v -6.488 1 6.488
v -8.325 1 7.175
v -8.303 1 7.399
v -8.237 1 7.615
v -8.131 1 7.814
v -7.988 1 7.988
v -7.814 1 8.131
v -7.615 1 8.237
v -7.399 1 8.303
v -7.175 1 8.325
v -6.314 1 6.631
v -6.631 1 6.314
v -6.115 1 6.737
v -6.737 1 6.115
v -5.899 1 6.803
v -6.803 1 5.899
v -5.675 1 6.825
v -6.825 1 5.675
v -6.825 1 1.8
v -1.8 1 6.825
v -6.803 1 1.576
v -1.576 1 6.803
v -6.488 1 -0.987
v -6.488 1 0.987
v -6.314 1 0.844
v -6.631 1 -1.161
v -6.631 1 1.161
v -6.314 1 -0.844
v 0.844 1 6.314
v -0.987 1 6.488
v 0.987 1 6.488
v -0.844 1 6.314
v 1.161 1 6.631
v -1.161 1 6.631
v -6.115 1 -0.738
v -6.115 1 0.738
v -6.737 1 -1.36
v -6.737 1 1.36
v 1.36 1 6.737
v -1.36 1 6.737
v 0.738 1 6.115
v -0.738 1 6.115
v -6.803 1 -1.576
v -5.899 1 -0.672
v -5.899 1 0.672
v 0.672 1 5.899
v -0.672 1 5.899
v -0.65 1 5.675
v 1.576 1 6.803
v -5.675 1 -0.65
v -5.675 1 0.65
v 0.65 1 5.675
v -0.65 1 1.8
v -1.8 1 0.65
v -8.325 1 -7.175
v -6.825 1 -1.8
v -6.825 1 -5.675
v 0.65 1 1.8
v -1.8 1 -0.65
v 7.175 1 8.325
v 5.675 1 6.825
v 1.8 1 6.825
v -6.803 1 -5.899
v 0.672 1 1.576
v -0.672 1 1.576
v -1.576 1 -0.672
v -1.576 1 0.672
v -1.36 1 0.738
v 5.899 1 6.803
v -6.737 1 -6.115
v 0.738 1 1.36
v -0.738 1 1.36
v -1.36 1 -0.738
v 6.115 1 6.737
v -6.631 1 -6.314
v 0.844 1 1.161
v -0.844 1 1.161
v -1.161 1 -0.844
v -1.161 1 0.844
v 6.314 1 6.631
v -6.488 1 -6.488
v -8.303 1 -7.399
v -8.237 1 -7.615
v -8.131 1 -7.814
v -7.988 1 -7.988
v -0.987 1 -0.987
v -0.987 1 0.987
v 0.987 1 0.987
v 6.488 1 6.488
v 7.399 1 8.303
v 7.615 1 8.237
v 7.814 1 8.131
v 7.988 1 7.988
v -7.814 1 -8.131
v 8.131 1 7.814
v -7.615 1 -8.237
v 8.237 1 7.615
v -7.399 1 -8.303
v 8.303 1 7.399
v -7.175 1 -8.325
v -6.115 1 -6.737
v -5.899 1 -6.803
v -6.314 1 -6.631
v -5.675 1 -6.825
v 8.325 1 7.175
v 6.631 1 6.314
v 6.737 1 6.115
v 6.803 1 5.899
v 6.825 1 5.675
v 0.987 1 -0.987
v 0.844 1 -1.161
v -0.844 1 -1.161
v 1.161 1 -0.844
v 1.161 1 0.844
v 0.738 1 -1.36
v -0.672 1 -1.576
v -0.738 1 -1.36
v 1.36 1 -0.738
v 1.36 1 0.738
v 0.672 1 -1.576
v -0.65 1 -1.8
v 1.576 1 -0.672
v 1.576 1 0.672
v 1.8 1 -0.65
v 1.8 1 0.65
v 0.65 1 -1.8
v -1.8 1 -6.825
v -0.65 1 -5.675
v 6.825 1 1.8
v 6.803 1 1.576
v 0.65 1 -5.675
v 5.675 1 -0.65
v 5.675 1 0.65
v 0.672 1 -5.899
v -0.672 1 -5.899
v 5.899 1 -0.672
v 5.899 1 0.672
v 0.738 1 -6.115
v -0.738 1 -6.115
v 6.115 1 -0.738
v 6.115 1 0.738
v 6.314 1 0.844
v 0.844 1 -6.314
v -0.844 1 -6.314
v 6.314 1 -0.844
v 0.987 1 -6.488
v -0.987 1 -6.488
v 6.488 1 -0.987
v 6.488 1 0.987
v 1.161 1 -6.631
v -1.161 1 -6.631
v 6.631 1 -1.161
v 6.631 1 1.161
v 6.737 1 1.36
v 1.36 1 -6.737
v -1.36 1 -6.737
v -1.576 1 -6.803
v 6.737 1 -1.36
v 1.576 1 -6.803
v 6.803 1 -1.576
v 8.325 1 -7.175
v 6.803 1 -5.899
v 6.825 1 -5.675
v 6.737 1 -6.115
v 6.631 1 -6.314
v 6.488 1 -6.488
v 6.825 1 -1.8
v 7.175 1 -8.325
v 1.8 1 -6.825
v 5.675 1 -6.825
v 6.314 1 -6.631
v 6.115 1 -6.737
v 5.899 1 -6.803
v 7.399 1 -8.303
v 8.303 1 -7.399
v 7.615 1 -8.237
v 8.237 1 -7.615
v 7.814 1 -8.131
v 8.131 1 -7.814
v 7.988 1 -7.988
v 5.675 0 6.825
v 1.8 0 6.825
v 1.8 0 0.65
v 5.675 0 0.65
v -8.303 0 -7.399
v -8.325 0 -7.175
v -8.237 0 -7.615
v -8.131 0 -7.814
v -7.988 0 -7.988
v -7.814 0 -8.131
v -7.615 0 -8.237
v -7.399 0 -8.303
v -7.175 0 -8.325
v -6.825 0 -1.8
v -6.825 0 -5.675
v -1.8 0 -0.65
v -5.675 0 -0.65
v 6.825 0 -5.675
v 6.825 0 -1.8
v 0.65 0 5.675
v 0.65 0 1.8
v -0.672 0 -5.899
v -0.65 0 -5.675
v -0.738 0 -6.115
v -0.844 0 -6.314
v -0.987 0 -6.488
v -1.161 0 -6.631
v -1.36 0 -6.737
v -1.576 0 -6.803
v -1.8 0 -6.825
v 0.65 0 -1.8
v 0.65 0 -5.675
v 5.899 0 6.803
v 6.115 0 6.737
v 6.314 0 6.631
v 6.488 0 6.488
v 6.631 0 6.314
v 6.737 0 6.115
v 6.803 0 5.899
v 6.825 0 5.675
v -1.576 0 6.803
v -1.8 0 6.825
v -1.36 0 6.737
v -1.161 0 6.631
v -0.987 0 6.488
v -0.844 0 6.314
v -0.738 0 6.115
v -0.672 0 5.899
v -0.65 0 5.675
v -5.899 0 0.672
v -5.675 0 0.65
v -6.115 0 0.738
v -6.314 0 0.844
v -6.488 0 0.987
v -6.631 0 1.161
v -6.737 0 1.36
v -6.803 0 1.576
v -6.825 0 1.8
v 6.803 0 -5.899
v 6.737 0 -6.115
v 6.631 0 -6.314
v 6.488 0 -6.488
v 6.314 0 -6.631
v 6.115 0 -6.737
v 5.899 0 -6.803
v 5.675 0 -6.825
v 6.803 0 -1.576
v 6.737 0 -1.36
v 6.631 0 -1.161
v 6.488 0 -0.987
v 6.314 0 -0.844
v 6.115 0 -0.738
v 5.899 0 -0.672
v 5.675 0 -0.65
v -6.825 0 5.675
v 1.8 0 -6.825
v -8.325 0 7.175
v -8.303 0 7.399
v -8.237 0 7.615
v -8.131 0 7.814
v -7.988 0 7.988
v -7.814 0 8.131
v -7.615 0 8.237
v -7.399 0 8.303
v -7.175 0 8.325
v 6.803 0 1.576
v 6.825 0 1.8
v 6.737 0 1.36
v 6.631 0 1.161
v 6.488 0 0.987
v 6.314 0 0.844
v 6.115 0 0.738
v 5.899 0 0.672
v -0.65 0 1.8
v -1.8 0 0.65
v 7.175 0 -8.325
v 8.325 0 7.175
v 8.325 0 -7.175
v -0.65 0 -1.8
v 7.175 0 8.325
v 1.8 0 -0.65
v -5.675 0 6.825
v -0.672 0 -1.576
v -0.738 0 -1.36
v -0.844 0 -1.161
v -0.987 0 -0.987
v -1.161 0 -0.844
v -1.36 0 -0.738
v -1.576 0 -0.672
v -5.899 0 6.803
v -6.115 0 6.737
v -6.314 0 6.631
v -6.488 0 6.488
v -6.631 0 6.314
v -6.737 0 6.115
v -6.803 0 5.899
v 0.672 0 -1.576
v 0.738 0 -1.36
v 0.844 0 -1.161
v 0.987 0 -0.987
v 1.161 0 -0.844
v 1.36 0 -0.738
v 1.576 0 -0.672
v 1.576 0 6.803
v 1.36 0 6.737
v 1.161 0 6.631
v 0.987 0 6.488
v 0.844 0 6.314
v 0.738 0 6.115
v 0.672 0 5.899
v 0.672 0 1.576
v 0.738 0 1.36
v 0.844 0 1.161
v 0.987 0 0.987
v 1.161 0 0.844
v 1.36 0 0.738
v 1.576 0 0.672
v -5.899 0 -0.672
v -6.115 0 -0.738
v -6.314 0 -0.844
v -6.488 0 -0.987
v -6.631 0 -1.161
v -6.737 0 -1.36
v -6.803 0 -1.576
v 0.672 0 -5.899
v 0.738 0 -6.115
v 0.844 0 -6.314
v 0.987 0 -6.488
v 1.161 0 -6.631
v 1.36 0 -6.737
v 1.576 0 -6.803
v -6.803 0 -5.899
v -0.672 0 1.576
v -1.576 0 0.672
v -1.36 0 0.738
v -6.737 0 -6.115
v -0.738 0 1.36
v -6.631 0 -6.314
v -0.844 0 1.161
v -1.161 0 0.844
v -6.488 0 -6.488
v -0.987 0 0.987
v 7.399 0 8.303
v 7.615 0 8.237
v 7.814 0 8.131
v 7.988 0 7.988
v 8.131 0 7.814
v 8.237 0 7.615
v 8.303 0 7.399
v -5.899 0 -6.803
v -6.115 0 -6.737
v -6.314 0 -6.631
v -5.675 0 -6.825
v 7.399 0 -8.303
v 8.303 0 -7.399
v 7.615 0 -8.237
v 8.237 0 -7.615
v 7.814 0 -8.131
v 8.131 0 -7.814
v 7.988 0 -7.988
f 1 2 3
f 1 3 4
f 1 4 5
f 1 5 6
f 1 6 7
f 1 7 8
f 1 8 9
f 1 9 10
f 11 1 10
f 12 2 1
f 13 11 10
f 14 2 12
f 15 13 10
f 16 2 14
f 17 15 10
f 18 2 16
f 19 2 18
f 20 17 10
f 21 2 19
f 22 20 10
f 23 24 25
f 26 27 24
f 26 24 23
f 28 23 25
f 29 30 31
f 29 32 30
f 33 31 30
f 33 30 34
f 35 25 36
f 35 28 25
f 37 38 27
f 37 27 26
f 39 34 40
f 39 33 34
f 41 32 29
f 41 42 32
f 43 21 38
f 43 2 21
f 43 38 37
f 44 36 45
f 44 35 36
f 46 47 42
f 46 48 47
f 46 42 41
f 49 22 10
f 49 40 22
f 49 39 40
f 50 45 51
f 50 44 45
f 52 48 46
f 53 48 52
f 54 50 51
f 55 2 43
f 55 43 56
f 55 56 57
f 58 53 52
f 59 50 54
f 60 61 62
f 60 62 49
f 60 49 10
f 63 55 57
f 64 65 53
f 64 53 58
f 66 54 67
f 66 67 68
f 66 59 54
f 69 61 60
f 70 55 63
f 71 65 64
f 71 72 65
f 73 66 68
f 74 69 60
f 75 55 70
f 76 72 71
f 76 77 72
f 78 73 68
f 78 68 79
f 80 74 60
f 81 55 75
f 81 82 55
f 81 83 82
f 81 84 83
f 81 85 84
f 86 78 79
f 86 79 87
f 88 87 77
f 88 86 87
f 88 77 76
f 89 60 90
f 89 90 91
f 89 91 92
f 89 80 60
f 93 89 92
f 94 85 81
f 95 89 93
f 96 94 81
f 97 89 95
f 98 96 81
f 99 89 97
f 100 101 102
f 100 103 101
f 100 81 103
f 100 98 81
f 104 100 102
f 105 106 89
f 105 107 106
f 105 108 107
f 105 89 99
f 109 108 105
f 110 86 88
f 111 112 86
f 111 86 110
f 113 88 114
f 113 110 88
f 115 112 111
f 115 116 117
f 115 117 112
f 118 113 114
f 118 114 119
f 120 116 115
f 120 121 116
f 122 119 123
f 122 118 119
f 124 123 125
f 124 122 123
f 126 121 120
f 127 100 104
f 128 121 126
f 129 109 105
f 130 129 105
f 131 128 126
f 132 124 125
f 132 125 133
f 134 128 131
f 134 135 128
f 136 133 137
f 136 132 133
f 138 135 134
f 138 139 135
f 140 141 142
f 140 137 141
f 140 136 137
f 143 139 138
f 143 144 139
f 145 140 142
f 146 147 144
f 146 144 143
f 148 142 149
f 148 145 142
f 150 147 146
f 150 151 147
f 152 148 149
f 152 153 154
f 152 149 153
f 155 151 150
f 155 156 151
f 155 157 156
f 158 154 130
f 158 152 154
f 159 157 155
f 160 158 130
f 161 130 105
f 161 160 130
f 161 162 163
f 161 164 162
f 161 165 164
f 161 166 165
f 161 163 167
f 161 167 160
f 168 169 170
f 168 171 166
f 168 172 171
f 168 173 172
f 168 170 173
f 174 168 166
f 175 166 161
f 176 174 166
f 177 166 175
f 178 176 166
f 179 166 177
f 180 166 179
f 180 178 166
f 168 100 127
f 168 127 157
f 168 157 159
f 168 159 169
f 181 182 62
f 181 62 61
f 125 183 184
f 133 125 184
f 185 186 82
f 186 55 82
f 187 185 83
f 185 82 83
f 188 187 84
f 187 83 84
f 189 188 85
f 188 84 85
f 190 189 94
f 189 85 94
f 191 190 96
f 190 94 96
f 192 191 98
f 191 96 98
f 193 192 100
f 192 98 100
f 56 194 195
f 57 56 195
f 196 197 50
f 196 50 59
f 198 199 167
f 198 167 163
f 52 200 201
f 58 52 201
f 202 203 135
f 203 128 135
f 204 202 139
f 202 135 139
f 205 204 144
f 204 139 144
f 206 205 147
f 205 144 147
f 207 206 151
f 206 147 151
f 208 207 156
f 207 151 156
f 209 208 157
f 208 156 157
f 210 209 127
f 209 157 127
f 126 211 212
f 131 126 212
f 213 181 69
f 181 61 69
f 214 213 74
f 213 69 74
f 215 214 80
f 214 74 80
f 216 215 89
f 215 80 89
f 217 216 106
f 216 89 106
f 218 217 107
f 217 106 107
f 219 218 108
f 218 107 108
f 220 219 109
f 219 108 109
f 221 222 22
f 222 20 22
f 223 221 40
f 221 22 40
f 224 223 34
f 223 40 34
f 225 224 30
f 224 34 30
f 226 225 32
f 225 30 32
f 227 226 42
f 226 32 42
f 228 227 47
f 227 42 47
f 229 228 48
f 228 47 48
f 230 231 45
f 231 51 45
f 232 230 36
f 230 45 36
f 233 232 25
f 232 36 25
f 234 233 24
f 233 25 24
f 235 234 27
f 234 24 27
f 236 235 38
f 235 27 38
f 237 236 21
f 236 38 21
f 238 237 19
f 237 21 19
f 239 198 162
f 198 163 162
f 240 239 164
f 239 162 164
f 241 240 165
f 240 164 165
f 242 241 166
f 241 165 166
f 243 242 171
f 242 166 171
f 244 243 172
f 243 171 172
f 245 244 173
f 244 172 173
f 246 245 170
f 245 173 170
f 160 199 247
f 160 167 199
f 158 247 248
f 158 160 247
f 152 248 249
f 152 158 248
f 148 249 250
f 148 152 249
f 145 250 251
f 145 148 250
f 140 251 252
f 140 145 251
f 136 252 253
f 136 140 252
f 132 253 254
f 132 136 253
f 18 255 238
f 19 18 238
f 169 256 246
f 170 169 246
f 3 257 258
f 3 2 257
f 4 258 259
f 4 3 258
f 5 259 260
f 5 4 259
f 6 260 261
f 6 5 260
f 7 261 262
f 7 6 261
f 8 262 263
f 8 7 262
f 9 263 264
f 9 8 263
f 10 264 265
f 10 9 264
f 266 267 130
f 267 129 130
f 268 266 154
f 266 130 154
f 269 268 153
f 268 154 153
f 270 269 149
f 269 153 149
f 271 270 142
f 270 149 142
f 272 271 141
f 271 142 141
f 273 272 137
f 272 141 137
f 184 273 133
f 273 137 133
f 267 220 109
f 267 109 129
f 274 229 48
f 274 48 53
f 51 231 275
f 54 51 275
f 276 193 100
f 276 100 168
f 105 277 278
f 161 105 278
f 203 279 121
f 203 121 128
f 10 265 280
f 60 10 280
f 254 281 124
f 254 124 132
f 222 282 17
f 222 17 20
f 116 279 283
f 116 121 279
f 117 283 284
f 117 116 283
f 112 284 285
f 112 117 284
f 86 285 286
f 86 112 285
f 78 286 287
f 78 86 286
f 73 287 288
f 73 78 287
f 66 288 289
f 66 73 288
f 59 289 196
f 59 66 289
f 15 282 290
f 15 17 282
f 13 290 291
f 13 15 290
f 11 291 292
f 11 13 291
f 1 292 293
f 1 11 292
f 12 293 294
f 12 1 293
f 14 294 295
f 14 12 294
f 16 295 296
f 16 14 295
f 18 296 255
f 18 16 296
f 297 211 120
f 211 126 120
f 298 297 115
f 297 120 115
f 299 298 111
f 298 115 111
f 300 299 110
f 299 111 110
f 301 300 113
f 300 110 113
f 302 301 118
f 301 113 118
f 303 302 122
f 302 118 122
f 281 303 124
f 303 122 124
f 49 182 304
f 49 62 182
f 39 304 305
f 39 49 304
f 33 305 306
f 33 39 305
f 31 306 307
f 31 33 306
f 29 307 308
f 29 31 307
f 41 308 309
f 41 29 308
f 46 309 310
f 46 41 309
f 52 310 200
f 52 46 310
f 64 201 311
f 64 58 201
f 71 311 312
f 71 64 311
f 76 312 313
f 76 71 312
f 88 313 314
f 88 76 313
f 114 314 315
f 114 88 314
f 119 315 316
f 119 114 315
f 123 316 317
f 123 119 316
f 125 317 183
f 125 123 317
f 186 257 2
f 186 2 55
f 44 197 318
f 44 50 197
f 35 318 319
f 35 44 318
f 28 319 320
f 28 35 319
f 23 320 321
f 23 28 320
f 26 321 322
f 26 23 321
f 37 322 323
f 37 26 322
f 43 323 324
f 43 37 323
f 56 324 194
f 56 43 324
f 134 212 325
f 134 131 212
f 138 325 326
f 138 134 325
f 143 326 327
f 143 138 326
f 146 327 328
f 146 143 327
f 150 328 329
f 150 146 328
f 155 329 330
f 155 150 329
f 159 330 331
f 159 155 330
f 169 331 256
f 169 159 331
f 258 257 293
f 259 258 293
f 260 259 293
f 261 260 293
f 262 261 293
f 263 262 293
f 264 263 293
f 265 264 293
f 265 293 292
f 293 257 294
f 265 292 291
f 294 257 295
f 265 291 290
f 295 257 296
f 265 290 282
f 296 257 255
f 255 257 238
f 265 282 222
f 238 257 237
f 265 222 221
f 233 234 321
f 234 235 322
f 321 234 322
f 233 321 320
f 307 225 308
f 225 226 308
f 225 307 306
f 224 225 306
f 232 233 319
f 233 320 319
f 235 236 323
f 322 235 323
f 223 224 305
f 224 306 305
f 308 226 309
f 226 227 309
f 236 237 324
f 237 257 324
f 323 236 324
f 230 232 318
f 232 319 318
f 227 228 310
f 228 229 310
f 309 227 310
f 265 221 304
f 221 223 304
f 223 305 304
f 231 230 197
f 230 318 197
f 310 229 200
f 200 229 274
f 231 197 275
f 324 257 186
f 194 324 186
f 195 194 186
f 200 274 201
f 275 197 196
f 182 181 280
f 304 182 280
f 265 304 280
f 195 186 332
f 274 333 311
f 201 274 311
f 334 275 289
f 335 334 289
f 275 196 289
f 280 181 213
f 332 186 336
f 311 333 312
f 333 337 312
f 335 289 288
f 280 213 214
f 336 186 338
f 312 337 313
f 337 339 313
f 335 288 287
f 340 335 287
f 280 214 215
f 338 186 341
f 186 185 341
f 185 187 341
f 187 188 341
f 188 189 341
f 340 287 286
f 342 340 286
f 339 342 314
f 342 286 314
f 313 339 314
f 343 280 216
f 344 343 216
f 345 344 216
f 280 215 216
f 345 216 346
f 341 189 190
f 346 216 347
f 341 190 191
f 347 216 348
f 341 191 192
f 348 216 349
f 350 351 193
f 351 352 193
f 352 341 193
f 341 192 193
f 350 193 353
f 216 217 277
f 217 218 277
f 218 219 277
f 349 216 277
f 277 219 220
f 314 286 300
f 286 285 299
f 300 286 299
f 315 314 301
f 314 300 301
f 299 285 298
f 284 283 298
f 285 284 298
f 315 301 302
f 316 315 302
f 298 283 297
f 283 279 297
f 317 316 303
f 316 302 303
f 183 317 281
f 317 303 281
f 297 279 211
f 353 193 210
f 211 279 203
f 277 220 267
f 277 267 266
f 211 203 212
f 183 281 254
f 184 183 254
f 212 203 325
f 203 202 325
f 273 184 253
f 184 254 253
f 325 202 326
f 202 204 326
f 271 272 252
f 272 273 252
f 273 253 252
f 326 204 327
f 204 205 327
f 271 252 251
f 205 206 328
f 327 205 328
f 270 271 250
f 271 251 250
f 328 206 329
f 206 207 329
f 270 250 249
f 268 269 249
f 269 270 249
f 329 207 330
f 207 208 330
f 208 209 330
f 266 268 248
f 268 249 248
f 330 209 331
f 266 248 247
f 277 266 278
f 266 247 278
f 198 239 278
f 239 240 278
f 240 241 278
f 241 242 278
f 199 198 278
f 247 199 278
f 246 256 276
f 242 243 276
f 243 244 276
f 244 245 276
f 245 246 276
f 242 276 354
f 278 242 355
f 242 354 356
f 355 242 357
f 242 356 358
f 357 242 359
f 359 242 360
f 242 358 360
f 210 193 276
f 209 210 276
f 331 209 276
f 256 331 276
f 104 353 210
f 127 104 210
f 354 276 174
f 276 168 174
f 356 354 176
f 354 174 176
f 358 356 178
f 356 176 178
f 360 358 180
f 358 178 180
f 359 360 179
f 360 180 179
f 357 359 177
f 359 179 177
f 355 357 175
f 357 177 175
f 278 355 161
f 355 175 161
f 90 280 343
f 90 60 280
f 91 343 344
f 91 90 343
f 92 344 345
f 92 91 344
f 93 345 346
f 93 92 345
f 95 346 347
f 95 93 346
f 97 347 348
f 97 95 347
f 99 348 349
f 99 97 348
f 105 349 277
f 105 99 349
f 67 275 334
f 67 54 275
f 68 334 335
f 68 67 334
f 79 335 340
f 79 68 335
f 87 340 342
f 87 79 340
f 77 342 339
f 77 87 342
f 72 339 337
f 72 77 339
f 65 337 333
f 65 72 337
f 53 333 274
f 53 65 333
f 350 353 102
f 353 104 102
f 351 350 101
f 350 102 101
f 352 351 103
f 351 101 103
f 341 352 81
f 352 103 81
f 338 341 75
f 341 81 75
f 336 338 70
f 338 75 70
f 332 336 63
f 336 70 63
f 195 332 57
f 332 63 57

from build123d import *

# Parameters (mm, degrees)
SKETCH1_W           = 16.65
SKETCH1_H           = 16.65
SKETCH1_W_2         = 13.65
SKETCH1_H_2         = 13.65
SKETCH1_W_3         = 6.175
SKETCH1_H_3         = 1.3
SKETCH1_W_4         = 1.3
SKETCH1_H_4         = 6.175
BOSS_EXTRUDE1_DEPTH = 1
FILLET1_R           = 1.15


with BuildPart() as part:
    # Sketch1 → Boss-Extrude1 (new body)
    # profile 1 of 6: a face of its own
    with BuildSketch(Plane(origin=(0, 0, 0), x_dir=(1, 0, 0), z_dir=(0, 1, 0))):
        Rectangle(SKETCH1_W, SKETCH1_H)
        Rectangle(SKETCH1_W_2, SKETCH1_H_2, mode=Mode.SUBTRACT)
    # profile 2 of 6: a face of its own
    with BuildSketch(Plane(origin=(0, 0, 0), x_dir=(1, 0, 0), z_dir=(0, 1, 0))):
        with Locations((-3.7375, 0)):
            Rectangle(SKETCH1_W_3, SKETCH1_H_3)
    # profile 3 of 6: a face of its own
    with BuildSketch(Plane(origin=(0, 0, 0), x_dir=(1, 0, 0), z_dir=(0, 1, 0))):
        Rectangle(SKETCH1_W_4, SKETCH1_H_3)
    # profile 4 of 6: a face of its own
    with BuildSketch(Plane(origin=(0, 0, 0), x_dir=(1, 0, 0), z_dir=(0, 1, 0))):
        with Locations((0, -3.7375)):
            Rectangle(SKETCH1_W_4, SKETCH1_H_4)
    # profile 5 of 6: a face of its own
    with BuildSketch(Plane(origin=(0, 0, 0), x_dir=(1, 0, 0), z_dir=(0, 1, 0))):
        with Locations((3.7375, 0)):
            Rectangle(SKETCH1_W_3, SKETCH1_H_3)
    # profile 6 of 6: a face of its own
    with BuildSketch(Plane(origin=(0, 0, 0), x_dir=(1, 0, 0), z_dir=(0, 1, 0))):
        with Locations((0, 3.7375)):
            Rectangle(SKETCH1_W_4, SKETCH1_H_4)
    extrude(amount=BOSS_EXTRUDE1_DEPTH)

    # Fillet1
    fillet1_edges = [part.edges().sort_by_distance(p)[0] for p in [
        (-6.825, 0.5, 0.65),
        (-6.825, 0.5, 6.825),
        (-0.65, 0.5, 6.825),
        (-0.65, 0.5, 0.65),
        (-8.325, 0.5, 8.325),
        (-8.325, 0.5, -8.325),
        (8.325, 0.5, -8.325),
        (8.325, 0.5, 8.325),
        (-0.65, 0.5, -6.825),
        (-6.825, 0.5, -6.825),
        (-6.825, 0.5, -0.65),
        (-0.65, 0.5, -0.65),
        (0.65, 0.5, 6.825),
        (6.825, 0.5, 6.825),
        (6.825, 0.5, 0.65),
        (0.65, 0.5, 0.65),
        (6.825, 0.5, -0.65),
        (6.825, 0.5, -6.825),
        (0.65, 0.5, -6.825),
        (0.65, 0.5, -0.65),
    ]]
    fillet(fillet1_edges, radius=FILLET1_R)


solid = part.part
